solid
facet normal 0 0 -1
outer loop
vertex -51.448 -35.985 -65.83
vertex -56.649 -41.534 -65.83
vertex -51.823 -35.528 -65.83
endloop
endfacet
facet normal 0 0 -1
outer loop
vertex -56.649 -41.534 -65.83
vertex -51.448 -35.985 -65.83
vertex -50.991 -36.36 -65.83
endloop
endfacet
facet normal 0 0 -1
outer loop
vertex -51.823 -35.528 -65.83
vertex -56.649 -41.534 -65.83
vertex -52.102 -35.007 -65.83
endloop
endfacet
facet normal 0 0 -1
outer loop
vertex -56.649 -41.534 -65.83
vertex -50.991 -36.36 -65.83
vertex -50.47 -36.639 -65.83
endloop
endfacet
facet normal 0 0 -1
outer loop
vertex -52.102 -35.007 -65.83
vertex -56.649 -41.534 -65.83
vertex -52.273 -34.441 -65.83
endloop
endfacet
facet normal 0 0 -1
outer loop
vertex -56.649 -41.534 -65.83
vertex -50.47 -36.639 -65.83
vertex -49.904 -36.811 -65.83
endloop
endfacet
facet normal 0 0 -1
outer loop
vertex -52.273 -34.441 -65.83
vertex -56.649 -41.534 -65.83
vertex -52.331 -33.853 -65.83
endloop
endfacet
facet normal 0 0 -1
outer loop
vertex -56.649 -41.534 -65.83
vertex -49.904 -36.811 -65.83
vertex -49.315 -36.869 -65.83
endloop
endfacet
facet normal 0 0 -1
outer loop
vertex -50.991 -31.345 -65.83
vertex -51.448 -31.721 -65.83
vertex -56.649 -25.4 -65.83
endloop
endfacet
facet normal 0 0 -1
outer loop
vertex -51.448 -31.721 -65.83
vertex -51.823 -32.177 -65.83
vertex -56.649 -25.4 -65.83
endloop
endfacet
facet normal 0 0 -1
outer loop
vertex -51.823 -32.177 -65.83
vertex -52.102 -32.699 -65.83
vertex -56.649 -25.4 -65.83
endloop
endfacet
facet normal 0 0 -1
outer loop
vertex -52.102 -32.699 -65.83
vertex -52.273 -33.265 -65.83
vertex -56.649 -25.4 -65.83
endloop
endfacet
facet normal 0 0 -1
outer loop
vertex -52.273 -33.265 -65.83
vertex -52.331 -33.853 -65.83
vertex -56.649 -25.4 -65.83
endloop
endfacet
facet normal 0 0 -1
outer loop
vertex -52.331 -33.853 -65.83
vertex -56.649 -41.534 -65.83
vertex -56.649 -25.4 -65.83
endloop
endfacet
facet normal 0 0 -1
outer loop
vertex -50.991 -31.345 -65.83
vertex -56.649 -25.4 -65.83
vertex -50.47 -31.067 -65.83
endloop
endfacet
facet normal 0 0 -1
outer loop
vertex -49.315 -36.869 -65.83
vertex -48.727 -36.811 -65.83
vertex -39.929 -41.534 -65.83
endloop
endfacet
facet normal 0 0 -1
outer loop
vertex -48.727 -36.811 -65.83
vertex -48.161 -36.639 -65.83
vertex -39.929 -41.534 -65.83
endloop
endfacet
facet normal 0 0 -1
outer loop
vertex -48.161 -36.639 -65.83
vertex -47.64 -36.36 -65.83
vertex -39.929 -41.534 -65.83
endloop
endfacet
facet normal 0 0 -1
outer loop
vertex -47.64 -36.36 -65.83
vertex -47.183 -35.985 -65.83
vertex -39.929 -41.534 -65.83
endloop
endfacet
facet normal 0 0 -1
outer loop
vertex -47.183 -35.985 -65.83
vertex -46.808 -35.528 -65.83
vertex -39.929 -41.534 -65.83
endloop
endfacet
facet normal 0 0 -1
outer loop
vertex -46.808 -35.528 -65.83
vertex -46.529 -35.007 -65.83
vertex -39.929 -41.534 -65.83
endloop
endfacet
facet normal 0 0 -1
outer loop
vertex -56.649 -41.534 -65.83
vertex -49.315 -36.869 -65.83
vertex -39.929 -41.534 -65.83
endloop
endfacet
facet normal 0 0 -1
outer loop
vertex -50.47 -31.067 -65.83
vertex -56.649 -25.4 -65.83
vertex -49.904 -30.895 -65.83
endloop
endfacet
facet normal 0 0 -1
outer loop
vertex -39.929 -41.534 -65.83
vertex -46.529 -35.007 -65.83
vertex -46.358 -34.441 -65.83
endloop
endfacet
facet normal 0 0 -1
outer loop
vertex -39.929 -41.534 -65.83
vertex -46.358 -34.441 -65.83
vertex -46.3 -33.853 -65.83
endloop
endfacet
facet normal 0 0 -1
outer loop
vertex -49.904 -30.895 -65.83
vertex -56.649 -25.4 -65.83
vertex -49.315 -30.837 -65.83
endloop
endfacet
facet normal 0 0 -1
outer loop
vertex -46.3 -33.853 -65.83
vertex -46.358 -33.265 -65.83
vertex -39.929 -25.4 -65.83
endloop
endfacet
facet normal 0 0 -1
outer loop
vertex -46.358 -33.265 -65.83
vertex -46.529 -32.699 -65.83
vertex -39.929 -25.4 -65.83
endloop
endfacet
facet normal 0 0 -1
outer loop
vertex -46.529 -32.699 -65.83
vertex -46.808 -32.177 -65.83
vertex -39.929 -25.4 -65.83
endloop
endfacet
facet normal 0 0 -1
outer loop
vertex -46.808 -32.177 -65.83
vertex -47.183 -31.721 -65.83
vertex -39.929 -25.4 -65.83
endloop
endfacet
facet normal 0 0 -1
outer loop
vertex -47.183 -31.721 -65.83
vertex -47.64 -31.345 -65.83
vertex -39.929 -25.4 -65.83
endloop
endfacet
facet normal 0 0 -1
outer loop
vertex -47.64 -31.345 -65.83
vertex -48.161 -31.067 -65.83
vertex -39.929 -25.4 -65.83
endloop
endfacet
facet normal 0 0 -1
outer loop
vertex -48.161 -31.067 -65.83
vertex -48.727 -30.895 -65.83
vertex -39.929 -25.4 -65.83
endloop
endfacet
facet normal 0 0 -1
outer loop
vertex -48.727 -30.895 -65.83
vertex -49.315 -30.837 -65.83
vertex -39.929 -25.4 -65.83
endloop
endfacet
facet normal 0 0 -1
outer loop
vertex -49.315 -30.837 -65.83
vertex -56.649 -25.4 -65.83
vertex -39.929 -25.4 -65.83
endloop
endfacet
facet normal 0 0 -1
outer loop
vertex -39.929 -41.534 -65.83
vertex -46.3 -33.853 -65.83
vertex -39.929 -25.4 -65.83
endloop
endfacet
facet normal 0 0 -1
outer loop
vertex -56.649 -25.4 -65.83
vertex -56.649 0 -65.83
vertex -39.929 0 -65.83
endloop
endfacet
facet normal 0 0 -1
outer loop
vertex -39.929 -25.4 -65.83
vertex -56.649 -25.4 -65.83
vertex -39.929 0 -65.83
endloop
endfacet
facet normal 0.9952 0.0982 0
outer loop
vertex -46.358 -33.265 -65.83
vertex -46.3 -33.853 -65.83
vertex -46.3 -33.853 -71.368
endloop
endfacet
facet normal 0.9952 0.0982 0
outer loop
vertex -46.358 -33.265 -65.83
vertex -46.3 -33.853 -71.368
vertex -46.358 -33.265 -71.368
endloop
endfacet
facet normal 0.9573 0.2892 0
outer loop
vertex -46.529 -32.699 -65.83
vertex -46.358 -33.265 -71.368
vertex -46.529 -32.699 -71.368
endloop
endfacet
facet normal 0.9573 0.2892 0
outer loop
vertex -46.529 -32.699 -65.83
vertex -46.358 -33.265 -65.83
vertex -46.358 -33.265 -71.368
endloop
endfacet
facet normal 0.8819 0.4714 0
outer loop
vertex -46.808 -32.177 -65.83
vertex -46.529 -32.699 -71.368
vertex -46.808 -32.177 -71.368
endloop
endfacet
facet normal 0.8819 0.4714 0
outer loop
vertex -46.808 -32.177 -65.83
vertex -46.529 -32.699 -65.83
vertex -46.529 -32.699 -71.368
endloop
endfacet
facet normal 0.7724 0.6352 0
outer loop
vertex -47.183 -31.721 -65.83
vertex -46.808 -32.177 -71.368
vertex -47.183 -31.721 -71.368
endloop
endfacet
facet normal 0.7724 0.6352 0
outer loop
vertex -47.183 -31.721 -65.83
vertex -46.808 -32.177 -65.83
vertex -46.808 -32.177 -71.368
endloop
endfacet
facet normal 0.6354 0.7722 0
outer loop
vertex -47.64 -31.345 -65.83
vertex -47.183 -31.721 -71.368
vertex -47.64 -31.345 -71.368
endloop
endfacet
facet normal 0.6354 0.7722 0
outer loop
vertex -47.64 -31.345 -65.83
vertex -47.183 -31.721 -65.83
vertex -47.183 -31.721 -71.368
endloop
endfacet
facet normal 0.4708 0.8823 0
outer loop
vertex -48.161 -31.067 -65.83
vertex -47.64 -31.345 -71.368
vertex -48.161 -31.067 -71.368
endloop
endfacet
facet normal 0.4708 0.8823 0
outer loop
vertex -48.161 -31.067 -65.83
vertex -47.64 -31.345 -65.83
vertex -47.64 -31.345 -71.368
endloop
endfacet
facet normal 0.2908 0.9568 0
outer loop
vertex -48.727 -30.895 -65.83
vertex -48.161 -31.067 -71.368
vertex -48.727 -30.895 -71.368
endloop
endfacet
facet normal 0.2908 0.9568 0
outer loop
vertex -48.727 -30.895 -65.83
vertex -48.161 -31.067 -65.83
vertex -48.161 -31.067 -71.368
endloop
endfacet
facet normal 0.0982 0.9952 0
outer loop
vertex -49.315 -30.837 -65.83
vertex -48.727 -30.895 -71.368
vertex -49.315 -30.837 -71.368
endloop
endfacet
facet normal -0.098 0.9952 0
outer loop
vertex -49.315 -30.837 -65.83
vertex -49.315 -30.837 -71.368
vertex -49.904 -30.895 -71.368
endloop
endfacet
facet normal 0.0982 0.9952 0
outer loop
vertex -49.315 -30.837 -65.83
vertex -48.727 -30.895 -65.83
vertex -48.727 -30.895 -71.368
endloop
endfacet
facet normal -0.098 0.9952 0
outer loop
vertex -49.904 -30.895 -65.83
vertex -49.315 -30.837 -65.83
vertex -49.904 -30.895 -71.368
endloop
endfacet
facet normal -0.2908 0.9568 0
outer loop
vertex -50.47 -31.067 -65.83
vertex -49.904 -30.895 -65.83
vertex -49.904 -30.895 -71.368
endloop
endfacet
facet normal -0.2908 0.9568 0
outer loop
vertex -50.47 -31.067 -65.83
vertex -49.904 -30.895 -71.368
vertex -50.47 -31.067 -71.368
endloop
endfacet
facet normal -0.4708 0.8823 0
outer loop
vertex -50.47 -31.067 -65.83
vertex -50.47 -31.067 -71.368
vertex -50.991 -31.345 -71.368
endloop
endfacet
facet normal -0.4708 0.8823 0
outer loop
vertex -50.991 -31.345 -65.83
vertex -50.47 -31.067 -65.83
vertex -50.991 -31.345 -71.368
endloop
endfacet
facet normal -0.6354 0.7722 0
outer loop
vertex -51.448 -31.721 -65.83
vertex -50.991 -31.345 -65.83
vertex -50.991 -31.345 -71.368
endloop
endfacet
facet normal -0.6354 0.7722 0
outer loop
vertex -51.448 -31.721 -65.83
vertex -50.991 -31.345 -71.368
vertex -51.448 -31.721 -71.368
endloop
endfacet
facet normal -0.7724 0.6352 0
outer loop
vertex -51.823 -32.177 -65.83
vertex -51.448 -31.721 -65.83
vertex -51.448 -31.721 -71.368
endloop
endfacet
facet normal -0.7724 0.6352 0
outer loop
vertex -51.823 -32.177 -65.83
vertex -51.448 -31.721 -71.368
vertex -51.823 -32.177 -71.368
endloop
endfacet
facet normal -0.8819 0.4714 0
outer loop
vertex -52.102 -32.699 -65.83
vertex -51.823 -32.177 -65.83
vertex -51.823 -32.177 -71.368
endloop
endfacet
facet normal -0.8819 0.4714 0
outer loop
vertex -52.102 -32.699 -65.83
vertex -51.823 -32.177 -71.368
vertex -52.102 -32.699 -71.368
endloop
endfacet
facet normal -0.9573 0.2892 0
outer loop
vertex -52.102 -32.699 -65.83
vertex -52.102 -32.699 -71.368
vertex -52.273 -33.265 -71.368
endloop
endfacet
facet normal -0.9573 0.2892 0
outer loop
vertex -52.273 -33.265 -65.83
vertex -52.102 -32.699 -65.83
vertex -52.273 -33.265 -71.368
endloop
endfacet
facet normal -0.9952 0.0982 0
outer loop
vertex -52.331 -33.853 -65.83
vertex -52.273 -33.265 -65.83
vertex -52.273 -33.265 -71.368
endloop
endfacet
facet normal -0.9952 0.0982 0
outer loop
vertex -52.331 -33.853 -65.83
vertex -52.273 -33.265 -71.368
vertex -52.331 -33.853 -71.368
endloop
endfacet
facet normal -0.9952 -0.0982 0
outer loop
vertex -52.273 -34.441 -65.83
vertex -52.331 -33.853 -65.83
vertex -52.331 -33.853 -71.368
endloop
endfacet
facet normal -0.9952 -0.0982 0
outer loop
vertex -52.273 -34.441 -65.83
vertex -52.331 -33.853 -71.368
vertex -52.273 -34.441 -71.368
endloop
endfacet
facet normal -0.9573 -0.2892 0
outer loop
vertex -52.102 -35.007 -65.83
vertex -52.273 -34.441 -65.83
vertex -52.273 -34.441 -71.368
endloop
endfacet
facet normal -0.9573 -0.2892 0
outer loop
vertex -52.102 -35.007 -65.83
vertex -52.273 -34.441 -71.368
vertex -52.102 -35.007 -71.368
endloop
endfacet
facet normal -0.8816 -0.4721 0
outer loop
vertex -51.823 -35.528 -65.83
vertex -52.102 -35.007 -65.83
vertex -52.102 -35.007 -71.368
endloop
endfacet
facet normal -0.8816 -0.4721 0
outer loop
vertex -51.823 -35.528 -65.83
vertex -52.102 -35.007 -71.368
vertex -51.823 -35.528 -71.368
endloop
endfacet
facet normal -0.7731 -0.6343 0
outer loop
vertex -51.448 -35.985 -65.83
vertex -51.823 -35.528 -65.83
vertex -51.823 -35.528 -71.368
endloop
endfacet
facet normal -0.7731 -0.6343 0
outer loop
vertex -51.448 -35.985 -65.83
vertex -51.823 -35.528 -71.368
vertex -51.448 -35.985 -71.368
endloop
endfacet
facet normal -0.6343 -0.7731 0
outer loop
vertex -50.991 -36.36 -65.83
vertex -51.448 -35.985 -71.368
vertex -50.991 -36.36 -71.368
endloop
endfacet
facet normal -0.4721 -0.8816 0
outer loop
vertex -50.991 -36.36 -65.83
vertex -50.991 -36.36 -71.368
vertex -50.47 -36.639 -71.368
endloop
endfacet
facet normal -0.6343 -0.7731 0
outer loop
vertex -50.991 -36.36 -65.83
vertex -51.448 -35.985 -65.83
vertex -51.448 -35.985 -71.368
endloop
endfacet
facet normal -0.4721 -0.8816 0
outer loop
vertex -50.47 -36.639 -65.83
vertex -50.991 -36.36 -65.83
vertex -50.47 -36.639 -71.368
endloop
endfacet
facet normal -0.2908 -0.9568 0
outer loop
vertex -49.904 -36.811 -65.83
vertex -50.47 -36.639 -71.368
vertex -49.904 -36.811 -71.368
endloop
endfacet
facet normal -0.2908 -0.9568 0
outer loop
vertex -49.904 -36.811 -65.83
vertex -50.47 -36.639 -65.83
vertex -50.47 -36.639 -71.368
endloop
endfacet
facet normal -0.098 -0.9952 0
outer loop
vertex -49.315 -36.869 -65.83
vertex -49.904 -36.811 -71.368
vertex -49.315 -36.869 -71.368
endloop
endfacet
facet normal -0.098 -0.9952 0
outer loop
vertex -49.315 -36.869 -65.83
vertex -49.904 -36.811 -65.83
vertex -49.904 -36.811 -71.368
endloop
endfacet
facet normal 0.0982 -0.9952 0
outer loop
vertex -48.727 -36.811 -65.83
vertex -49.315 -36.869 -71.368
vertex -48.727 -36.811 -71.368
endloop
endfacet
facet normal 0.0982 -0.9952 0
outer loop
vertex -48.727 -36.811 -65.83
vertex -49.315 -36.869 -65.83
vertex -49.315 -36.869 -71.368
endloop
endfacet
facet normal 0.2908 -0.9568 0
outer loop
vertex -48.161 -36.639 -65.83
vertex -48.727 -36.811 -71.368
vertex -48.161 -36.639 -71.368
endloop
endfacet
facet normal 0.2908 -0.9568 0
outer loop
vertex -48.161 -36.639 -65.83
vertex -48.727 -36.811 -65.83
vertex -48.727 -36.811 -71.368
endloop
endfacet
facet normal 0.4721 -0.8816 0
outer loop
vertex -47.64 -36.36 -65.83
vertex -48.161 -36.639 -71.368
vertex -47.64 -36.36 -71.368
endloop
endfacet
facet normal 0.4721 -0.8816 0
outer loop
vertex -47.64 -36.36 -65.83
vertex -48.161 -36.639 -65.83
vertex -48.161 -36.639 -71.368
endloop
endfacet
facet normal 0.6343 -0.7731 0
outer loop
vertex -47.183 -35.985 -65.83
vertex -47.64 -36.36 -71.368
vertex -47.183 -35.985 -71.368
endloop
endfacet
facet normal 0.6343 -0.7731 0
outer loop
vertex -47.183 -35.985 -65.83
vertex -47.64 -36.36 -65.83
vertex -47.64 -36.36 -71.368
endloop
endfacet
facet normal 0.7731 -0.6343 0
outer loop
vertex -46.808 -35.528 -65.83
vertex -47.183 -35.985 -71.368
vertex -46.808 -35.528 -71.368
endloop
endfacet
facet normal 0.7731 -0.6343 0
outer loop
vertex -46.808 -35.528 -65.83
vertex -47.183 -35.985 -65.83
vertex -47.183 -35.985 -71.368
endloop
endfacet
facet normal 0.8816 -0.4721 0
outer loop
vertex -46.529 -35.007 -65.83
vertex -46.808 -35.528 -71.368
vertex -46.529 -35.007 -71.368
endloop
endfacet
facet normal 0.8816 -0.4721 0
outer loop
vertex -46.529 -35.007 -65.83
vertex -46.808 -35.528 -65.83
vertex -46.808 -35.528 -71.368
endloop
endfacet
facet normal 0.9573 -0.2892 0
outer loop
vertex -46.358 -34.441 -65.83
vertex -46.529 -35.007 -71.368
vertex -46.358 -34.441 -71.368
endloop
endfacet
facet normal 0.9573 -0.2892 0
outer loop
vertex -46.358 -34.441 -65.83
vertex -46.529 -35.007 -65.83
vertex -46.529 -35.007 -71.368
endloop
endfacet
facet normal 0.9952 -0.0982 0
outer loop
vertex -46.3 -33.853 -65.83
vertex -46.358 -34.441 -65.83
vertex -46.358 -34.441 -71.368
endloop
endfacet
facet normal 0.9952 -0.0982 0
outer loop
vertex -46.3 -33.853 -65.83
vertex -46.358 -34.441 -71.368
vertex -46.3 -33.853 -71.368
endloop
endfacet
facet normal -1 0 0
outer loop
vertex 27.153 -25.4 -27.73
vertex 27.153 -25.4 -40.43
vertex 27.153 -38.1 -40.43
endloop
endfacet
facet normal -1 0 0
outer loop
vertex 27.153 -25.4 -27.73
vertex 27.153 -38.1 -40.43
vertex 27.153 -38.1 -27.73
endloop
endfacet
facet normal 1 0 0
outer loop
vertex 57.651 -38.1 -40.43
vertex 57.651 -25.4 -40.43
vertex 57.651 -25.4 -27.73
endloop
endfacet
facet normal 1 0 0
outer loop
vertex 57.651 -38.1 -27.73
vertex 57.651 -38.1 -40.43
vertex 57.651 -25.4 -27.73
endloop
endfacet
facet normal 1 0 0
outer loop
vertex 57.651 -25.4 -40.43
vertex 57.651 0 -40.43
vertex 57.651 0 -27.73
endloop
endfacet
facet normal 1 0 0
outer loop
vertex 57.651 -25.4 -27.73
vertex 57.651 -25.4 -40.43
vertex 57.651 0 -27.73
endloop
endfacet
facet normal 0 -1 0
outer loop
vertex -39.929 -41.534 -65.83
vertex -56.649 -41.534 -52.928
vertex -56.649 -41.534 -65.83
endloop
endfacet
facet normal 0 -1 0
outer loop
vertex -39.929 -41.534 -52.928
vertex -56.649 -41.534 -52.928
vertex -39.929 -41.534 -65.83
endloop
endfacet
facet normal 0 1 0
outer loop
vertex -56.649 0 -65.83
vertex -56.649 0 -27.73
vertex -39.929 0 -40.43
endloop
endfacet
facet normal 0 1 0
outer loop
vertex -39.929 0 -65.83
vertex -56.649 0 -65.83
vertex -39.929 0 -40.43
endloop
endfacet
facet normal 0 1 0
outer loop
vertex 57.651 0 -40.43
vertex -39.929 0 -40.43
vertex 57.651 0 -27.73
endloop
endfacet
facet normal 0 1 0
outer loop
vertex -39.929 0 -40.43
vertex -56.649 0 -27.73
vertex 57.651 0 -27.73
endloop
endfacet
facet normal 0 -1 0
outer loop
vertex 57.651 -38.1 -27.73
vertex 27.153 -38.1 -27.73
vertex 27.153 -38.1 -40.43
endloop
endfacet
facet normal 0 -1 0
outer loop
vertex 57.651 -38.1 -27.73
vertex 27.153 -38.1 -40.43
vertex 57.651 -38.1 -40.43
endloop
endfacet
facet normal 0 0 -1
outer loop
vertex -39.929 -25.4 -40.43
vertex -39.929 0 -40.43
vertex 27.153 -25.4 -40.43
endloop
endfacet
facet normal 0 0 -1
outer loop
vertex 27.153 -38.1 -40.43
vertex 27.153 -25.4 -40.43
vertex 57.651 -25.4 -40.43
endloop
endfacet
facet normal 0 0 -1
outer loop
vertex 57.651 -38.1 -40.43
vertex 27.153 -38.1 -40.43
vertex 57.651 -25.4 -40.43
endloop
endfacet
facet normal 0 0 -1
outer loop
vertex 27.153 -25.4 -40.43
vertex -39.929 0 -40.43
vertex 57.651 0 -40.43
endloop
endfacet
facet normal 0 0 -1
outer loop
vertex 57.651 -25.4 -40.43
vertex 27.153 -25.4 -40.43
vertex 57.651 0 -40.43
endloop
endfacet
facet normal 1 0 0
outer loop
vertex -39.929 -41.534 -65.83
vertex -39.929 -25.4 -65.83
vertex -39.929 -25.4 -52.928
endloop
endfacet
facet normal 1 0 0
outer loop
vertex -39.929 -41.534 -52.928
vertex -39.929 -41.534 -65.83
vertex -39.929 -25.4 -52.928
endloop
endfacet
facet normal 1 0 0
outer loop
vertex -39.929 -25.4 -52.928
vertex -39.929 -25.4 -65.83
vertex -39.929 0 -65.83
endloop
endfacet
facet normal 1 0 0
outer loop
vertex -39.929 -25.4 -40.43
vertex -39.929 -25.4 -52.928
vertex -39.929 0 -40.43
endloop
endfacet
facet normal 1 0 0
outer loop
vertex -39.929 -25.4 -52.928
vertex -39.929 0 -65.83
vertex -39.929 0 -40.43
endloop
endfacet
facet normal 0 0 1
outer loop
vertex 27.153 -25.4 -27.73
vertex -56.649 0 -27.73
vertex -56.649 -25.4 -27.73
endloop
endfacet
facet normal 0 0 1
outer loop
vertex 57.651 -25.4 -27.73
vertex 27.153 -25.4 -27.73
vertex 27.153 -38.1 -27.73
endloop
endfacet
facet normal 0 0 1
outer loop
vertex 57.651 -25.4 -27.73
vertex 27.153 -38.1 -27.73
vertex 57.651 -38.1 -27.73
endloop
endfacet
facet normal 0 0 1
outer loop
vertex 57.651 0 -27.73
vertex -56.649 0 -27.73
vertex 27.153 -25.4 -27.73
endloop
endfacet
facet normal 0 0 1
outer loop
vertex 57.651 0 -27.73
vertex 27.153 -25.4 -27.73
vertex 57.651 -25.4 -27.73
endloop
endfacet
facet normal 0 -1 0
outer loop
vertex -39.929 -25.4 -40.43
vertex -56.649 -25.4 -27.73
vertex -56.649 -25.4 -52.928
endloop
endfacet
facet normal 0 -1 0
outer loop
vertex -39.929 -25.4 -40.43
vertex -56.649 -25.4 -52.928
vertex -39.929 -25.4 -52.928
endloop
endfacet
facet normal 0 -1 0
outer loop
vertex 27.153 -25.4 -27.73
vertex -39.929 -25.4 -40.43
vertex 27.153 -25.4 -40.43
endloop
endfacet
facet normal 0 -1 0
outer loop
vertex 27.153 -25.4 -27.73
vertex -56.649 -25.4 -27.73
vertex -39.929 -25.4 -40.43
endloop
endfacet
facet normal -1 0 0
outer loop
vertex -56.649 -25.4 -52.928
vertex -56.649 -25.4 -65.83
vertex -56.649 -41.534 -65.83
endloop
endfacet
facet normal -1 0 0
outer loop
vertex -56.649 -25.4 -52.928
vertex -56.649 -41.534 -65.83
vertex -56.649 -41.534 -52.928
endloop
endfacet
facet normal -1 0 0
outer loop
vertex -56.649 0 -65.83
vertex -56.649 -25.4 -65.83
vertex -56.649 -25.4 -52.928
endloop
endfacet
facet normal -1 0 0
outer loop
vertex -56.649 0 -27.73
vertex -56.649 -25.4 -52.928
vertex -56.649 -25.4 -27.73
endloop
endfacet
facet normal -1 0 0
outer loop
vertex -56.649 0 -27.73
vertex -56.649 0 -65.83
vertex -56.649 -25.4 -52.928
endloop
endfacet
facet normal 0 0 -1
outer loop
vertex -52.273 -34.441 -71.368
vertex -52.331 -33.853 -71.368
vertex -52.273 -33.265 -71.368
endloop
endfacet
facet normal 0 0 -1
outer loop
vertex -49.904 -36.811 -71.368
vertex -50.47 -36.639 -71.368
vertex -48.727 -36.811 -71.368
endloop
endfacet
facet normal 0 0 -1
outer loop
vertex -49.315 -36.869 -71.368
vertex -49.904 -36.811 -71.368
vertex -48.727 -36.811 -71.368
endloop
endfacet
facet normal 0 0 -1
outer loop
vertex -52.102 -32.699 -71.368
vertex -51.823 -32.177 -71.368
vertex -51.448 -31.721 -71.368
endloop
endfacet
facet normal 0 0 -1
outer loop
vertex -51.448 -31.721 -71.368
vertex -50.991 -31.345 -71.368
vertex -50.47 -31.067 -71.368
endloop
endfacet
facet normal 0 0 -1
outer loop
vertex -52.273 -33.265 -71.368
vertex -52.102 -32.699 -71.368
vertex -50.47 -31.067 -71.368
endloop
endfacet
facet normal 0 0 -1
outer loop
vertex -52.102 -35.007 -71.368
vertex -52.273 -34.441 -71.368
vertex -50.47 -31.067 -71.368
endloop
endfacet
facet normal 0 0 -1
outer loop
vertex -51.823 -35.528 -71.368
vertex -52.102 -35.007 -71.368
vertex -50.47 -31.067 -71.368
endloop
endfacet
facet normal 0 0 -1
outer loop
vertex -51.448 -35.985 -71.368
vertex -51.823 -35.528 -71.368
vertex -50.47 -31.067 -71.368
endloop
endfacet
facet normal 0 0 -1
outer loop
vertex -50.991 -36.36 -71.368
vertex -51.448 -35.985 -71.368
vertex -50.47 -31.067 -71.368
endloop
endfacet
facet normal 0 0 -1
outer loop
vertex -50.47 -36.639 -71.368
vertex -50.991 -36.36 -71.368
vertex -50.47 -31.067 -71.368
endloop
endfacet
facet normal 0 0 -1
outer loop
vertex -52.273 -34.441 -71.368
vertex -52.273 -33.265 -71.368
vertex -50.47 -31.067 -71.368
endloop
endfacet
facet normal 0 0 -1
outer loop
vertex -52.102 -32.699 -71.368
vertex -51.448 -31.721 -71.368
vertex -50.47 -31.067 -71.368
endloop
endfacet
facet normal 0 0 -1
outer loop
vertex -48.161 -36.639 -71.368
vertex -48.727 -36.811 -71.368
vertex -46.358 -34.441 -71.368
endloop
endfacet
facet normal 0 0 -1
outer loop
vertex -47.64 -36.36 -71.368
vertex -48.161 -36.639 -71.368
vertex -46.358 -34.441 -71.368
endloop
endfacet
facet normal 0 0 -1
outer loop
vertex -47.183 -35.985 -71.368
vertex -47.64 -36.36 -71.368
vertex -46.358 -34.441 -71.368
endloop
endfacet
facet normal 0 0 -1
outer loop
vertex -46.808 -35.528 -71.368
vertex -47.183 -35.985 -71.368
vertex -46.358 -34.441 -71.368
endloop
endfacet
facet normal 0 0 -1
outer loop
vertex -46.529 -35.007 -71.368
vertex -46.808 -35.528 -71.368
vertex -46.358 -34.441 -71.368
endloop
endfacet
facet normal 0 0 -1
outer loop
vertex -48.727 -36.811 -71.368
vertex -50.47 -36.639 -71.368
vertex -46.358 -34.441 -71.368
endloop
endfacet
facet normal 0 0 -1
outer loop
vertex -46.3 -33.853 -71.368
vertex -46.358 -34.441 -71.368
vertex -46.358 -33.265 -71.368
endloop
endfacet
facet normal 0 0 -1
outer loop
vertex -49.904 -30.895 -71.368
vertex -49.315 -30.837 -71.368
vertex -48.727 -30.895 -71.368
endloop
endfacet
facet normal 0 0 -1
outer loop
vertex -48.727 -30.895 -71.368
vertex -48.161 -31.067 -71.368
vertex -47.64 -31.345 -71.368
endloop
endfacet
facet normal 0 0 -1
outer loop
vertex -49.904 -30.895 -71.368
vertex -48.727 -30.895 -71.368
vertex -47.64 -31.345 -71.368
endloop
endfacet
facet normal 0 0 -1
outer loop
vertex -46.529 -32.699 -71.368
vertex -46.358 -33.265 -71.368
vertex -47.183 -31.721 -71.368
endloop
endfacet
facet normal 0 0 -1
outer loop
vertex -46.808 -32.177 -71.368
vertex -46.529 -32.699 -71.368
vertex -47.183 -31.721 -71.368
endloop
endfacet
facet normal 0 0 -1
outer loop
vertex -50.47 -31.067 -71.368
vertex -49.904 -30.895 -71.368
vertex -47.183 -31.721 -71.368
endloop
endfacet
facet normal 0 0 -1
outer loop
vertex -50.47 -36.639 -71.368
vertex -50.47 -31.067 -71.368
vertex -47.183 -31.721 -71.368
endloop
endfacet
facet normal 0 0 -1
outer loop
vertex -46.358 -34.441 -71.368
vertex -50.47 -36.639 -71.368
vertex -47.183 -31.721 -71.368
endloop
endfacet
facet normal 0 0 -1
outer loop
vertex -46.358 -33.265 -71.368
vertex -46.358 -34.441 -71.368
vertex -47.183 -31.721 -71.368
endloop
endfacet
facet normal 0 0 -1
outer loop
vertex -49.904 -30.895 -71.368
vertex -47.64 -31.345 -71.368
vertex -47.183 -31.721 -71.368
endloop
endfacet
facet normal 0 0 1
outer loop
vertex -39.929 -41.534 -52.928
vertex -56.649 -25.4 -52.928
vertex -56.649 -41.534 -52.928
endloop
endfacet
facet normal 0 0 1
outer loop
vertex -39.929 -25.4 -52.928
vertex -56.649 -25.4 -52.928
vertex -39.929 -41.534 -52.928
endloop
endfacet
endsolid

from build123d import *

# Parameters (mm, degrees)
F1_DEPTH = 25.4
F2_W     = 16.7198777199
F2_H     = 12.9023268819
F3_DEPTH = 16.1335784942
F5_W     = 30.4973670125
F5_H     = 12.7
F6_DEPTH = 12.7
F7_R     = 3.015717516
F8_DEPTH = 18.4404


with BuildPart() as f1:
    # F0 (on Front) → F1 (new body)
    with BuildSketch(Plane.XZ):
        Polygon((57.6506801724, -27.7302754164), (-56.6493198276, -27.7302754164), (-56.6493198276, -65.8302754164), (-39.9294421077, -65.8302754164), (-39.9294421077, -40.4302754164), (57.6506801724, -40.4302754164), align=None)
    extrude(amount=F1_DEPTH)

    # F2 (on face) → F3 (join)
    with BuildSketch(Plane.XZ.offset(25.4)):
        with Locations((-48.2893809676, -59.3791119754)):
            Rectangle(F2_W, F2_H)
    extrude(amount=F3_DEPTH)

    # F5 (on face) → F6 (join)
    with BuildSketch(Plane.XZ.offset(25.4)):
        with Locations((42.4019966662, -34.0802754164)):
            Rectangle(F5_W, F5_H)
    extrude(amount=F6_DEPTH)

    # F7 (on face) → F8 (join)
    with BuildSketch(Plane.XY.offset(-52.9279485345)):
        with Locations((-49.315456301, -33.8529422879)):
            Circle(F7_R)
    extrude(amount=-F8_DEPTH)


solid = f1.part
